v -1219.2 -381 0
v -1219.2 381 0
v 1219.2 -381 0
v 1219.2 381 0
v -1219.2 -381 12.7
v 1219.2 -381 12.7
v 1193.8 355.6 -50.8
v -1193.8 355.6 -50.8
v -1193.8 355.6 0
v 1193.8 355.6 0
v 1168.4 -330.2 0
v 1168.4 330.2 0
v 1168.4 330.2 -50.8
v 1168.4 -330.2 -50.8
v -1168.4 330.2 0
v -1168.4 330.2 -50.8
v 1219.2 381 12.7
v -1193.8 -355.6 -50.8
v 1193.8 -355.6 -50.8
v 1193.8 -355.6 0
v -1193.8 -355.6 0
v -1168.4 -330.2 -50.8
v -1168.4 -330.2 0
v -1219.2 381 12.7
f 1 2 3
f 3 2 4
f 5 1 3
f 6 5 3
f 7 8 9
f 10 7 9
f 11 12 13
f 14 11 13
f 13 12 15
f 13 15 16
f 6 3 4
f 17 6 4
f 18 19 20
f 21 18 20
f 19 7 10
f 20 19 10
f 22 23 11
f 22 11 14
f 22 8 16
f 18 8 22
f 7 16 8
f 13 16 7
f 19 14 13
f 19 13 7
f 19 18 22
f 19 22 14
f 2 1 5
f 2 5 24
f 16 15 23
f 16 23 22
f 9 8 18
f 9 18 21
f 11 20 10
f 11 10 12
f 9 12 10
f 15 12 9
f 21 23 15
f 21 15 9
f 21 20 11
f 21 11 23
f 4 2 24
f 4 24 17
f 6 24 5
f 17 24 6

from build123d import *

# Parameters (mm, degrees)
F1_W     = 25.4
F1_H     = 50.8
F0_W     = 2438.4
F0_H     = 762
F3_DEPTH = 12.7


with BuildPart() as f2:
    # F2: sweep along a path in F0
    with BuildLine(Plane.XY) as f2_path:
        Line((1219.2, 381), (1219.2, -381))
        Line((1219.2, -381), (-1219.2, -381))
        Line((-1219.2, -381), (-1219.2, 381))
        Line((-1219.2, 381), (1219.2, 381))
    # F1 (on Front) → F2 (sweep)
    with BuildSketch(Plane.XZ):
        with Locations((1181.1, -25.4)):
            Rectangle(F1_W, F1_H)
    sweep(path=f2_path.line, transition=Transition.RIGHT)


with BuildPart() as f3:
    # F0 (on Top) → F3 (new body)
    with BuildSketch(Plane.XY):
        Rectangle(F0_W, F0_H)
    extrude(amount=F3_DEPTH)


solid = Compound([f2.part, f3.part])
